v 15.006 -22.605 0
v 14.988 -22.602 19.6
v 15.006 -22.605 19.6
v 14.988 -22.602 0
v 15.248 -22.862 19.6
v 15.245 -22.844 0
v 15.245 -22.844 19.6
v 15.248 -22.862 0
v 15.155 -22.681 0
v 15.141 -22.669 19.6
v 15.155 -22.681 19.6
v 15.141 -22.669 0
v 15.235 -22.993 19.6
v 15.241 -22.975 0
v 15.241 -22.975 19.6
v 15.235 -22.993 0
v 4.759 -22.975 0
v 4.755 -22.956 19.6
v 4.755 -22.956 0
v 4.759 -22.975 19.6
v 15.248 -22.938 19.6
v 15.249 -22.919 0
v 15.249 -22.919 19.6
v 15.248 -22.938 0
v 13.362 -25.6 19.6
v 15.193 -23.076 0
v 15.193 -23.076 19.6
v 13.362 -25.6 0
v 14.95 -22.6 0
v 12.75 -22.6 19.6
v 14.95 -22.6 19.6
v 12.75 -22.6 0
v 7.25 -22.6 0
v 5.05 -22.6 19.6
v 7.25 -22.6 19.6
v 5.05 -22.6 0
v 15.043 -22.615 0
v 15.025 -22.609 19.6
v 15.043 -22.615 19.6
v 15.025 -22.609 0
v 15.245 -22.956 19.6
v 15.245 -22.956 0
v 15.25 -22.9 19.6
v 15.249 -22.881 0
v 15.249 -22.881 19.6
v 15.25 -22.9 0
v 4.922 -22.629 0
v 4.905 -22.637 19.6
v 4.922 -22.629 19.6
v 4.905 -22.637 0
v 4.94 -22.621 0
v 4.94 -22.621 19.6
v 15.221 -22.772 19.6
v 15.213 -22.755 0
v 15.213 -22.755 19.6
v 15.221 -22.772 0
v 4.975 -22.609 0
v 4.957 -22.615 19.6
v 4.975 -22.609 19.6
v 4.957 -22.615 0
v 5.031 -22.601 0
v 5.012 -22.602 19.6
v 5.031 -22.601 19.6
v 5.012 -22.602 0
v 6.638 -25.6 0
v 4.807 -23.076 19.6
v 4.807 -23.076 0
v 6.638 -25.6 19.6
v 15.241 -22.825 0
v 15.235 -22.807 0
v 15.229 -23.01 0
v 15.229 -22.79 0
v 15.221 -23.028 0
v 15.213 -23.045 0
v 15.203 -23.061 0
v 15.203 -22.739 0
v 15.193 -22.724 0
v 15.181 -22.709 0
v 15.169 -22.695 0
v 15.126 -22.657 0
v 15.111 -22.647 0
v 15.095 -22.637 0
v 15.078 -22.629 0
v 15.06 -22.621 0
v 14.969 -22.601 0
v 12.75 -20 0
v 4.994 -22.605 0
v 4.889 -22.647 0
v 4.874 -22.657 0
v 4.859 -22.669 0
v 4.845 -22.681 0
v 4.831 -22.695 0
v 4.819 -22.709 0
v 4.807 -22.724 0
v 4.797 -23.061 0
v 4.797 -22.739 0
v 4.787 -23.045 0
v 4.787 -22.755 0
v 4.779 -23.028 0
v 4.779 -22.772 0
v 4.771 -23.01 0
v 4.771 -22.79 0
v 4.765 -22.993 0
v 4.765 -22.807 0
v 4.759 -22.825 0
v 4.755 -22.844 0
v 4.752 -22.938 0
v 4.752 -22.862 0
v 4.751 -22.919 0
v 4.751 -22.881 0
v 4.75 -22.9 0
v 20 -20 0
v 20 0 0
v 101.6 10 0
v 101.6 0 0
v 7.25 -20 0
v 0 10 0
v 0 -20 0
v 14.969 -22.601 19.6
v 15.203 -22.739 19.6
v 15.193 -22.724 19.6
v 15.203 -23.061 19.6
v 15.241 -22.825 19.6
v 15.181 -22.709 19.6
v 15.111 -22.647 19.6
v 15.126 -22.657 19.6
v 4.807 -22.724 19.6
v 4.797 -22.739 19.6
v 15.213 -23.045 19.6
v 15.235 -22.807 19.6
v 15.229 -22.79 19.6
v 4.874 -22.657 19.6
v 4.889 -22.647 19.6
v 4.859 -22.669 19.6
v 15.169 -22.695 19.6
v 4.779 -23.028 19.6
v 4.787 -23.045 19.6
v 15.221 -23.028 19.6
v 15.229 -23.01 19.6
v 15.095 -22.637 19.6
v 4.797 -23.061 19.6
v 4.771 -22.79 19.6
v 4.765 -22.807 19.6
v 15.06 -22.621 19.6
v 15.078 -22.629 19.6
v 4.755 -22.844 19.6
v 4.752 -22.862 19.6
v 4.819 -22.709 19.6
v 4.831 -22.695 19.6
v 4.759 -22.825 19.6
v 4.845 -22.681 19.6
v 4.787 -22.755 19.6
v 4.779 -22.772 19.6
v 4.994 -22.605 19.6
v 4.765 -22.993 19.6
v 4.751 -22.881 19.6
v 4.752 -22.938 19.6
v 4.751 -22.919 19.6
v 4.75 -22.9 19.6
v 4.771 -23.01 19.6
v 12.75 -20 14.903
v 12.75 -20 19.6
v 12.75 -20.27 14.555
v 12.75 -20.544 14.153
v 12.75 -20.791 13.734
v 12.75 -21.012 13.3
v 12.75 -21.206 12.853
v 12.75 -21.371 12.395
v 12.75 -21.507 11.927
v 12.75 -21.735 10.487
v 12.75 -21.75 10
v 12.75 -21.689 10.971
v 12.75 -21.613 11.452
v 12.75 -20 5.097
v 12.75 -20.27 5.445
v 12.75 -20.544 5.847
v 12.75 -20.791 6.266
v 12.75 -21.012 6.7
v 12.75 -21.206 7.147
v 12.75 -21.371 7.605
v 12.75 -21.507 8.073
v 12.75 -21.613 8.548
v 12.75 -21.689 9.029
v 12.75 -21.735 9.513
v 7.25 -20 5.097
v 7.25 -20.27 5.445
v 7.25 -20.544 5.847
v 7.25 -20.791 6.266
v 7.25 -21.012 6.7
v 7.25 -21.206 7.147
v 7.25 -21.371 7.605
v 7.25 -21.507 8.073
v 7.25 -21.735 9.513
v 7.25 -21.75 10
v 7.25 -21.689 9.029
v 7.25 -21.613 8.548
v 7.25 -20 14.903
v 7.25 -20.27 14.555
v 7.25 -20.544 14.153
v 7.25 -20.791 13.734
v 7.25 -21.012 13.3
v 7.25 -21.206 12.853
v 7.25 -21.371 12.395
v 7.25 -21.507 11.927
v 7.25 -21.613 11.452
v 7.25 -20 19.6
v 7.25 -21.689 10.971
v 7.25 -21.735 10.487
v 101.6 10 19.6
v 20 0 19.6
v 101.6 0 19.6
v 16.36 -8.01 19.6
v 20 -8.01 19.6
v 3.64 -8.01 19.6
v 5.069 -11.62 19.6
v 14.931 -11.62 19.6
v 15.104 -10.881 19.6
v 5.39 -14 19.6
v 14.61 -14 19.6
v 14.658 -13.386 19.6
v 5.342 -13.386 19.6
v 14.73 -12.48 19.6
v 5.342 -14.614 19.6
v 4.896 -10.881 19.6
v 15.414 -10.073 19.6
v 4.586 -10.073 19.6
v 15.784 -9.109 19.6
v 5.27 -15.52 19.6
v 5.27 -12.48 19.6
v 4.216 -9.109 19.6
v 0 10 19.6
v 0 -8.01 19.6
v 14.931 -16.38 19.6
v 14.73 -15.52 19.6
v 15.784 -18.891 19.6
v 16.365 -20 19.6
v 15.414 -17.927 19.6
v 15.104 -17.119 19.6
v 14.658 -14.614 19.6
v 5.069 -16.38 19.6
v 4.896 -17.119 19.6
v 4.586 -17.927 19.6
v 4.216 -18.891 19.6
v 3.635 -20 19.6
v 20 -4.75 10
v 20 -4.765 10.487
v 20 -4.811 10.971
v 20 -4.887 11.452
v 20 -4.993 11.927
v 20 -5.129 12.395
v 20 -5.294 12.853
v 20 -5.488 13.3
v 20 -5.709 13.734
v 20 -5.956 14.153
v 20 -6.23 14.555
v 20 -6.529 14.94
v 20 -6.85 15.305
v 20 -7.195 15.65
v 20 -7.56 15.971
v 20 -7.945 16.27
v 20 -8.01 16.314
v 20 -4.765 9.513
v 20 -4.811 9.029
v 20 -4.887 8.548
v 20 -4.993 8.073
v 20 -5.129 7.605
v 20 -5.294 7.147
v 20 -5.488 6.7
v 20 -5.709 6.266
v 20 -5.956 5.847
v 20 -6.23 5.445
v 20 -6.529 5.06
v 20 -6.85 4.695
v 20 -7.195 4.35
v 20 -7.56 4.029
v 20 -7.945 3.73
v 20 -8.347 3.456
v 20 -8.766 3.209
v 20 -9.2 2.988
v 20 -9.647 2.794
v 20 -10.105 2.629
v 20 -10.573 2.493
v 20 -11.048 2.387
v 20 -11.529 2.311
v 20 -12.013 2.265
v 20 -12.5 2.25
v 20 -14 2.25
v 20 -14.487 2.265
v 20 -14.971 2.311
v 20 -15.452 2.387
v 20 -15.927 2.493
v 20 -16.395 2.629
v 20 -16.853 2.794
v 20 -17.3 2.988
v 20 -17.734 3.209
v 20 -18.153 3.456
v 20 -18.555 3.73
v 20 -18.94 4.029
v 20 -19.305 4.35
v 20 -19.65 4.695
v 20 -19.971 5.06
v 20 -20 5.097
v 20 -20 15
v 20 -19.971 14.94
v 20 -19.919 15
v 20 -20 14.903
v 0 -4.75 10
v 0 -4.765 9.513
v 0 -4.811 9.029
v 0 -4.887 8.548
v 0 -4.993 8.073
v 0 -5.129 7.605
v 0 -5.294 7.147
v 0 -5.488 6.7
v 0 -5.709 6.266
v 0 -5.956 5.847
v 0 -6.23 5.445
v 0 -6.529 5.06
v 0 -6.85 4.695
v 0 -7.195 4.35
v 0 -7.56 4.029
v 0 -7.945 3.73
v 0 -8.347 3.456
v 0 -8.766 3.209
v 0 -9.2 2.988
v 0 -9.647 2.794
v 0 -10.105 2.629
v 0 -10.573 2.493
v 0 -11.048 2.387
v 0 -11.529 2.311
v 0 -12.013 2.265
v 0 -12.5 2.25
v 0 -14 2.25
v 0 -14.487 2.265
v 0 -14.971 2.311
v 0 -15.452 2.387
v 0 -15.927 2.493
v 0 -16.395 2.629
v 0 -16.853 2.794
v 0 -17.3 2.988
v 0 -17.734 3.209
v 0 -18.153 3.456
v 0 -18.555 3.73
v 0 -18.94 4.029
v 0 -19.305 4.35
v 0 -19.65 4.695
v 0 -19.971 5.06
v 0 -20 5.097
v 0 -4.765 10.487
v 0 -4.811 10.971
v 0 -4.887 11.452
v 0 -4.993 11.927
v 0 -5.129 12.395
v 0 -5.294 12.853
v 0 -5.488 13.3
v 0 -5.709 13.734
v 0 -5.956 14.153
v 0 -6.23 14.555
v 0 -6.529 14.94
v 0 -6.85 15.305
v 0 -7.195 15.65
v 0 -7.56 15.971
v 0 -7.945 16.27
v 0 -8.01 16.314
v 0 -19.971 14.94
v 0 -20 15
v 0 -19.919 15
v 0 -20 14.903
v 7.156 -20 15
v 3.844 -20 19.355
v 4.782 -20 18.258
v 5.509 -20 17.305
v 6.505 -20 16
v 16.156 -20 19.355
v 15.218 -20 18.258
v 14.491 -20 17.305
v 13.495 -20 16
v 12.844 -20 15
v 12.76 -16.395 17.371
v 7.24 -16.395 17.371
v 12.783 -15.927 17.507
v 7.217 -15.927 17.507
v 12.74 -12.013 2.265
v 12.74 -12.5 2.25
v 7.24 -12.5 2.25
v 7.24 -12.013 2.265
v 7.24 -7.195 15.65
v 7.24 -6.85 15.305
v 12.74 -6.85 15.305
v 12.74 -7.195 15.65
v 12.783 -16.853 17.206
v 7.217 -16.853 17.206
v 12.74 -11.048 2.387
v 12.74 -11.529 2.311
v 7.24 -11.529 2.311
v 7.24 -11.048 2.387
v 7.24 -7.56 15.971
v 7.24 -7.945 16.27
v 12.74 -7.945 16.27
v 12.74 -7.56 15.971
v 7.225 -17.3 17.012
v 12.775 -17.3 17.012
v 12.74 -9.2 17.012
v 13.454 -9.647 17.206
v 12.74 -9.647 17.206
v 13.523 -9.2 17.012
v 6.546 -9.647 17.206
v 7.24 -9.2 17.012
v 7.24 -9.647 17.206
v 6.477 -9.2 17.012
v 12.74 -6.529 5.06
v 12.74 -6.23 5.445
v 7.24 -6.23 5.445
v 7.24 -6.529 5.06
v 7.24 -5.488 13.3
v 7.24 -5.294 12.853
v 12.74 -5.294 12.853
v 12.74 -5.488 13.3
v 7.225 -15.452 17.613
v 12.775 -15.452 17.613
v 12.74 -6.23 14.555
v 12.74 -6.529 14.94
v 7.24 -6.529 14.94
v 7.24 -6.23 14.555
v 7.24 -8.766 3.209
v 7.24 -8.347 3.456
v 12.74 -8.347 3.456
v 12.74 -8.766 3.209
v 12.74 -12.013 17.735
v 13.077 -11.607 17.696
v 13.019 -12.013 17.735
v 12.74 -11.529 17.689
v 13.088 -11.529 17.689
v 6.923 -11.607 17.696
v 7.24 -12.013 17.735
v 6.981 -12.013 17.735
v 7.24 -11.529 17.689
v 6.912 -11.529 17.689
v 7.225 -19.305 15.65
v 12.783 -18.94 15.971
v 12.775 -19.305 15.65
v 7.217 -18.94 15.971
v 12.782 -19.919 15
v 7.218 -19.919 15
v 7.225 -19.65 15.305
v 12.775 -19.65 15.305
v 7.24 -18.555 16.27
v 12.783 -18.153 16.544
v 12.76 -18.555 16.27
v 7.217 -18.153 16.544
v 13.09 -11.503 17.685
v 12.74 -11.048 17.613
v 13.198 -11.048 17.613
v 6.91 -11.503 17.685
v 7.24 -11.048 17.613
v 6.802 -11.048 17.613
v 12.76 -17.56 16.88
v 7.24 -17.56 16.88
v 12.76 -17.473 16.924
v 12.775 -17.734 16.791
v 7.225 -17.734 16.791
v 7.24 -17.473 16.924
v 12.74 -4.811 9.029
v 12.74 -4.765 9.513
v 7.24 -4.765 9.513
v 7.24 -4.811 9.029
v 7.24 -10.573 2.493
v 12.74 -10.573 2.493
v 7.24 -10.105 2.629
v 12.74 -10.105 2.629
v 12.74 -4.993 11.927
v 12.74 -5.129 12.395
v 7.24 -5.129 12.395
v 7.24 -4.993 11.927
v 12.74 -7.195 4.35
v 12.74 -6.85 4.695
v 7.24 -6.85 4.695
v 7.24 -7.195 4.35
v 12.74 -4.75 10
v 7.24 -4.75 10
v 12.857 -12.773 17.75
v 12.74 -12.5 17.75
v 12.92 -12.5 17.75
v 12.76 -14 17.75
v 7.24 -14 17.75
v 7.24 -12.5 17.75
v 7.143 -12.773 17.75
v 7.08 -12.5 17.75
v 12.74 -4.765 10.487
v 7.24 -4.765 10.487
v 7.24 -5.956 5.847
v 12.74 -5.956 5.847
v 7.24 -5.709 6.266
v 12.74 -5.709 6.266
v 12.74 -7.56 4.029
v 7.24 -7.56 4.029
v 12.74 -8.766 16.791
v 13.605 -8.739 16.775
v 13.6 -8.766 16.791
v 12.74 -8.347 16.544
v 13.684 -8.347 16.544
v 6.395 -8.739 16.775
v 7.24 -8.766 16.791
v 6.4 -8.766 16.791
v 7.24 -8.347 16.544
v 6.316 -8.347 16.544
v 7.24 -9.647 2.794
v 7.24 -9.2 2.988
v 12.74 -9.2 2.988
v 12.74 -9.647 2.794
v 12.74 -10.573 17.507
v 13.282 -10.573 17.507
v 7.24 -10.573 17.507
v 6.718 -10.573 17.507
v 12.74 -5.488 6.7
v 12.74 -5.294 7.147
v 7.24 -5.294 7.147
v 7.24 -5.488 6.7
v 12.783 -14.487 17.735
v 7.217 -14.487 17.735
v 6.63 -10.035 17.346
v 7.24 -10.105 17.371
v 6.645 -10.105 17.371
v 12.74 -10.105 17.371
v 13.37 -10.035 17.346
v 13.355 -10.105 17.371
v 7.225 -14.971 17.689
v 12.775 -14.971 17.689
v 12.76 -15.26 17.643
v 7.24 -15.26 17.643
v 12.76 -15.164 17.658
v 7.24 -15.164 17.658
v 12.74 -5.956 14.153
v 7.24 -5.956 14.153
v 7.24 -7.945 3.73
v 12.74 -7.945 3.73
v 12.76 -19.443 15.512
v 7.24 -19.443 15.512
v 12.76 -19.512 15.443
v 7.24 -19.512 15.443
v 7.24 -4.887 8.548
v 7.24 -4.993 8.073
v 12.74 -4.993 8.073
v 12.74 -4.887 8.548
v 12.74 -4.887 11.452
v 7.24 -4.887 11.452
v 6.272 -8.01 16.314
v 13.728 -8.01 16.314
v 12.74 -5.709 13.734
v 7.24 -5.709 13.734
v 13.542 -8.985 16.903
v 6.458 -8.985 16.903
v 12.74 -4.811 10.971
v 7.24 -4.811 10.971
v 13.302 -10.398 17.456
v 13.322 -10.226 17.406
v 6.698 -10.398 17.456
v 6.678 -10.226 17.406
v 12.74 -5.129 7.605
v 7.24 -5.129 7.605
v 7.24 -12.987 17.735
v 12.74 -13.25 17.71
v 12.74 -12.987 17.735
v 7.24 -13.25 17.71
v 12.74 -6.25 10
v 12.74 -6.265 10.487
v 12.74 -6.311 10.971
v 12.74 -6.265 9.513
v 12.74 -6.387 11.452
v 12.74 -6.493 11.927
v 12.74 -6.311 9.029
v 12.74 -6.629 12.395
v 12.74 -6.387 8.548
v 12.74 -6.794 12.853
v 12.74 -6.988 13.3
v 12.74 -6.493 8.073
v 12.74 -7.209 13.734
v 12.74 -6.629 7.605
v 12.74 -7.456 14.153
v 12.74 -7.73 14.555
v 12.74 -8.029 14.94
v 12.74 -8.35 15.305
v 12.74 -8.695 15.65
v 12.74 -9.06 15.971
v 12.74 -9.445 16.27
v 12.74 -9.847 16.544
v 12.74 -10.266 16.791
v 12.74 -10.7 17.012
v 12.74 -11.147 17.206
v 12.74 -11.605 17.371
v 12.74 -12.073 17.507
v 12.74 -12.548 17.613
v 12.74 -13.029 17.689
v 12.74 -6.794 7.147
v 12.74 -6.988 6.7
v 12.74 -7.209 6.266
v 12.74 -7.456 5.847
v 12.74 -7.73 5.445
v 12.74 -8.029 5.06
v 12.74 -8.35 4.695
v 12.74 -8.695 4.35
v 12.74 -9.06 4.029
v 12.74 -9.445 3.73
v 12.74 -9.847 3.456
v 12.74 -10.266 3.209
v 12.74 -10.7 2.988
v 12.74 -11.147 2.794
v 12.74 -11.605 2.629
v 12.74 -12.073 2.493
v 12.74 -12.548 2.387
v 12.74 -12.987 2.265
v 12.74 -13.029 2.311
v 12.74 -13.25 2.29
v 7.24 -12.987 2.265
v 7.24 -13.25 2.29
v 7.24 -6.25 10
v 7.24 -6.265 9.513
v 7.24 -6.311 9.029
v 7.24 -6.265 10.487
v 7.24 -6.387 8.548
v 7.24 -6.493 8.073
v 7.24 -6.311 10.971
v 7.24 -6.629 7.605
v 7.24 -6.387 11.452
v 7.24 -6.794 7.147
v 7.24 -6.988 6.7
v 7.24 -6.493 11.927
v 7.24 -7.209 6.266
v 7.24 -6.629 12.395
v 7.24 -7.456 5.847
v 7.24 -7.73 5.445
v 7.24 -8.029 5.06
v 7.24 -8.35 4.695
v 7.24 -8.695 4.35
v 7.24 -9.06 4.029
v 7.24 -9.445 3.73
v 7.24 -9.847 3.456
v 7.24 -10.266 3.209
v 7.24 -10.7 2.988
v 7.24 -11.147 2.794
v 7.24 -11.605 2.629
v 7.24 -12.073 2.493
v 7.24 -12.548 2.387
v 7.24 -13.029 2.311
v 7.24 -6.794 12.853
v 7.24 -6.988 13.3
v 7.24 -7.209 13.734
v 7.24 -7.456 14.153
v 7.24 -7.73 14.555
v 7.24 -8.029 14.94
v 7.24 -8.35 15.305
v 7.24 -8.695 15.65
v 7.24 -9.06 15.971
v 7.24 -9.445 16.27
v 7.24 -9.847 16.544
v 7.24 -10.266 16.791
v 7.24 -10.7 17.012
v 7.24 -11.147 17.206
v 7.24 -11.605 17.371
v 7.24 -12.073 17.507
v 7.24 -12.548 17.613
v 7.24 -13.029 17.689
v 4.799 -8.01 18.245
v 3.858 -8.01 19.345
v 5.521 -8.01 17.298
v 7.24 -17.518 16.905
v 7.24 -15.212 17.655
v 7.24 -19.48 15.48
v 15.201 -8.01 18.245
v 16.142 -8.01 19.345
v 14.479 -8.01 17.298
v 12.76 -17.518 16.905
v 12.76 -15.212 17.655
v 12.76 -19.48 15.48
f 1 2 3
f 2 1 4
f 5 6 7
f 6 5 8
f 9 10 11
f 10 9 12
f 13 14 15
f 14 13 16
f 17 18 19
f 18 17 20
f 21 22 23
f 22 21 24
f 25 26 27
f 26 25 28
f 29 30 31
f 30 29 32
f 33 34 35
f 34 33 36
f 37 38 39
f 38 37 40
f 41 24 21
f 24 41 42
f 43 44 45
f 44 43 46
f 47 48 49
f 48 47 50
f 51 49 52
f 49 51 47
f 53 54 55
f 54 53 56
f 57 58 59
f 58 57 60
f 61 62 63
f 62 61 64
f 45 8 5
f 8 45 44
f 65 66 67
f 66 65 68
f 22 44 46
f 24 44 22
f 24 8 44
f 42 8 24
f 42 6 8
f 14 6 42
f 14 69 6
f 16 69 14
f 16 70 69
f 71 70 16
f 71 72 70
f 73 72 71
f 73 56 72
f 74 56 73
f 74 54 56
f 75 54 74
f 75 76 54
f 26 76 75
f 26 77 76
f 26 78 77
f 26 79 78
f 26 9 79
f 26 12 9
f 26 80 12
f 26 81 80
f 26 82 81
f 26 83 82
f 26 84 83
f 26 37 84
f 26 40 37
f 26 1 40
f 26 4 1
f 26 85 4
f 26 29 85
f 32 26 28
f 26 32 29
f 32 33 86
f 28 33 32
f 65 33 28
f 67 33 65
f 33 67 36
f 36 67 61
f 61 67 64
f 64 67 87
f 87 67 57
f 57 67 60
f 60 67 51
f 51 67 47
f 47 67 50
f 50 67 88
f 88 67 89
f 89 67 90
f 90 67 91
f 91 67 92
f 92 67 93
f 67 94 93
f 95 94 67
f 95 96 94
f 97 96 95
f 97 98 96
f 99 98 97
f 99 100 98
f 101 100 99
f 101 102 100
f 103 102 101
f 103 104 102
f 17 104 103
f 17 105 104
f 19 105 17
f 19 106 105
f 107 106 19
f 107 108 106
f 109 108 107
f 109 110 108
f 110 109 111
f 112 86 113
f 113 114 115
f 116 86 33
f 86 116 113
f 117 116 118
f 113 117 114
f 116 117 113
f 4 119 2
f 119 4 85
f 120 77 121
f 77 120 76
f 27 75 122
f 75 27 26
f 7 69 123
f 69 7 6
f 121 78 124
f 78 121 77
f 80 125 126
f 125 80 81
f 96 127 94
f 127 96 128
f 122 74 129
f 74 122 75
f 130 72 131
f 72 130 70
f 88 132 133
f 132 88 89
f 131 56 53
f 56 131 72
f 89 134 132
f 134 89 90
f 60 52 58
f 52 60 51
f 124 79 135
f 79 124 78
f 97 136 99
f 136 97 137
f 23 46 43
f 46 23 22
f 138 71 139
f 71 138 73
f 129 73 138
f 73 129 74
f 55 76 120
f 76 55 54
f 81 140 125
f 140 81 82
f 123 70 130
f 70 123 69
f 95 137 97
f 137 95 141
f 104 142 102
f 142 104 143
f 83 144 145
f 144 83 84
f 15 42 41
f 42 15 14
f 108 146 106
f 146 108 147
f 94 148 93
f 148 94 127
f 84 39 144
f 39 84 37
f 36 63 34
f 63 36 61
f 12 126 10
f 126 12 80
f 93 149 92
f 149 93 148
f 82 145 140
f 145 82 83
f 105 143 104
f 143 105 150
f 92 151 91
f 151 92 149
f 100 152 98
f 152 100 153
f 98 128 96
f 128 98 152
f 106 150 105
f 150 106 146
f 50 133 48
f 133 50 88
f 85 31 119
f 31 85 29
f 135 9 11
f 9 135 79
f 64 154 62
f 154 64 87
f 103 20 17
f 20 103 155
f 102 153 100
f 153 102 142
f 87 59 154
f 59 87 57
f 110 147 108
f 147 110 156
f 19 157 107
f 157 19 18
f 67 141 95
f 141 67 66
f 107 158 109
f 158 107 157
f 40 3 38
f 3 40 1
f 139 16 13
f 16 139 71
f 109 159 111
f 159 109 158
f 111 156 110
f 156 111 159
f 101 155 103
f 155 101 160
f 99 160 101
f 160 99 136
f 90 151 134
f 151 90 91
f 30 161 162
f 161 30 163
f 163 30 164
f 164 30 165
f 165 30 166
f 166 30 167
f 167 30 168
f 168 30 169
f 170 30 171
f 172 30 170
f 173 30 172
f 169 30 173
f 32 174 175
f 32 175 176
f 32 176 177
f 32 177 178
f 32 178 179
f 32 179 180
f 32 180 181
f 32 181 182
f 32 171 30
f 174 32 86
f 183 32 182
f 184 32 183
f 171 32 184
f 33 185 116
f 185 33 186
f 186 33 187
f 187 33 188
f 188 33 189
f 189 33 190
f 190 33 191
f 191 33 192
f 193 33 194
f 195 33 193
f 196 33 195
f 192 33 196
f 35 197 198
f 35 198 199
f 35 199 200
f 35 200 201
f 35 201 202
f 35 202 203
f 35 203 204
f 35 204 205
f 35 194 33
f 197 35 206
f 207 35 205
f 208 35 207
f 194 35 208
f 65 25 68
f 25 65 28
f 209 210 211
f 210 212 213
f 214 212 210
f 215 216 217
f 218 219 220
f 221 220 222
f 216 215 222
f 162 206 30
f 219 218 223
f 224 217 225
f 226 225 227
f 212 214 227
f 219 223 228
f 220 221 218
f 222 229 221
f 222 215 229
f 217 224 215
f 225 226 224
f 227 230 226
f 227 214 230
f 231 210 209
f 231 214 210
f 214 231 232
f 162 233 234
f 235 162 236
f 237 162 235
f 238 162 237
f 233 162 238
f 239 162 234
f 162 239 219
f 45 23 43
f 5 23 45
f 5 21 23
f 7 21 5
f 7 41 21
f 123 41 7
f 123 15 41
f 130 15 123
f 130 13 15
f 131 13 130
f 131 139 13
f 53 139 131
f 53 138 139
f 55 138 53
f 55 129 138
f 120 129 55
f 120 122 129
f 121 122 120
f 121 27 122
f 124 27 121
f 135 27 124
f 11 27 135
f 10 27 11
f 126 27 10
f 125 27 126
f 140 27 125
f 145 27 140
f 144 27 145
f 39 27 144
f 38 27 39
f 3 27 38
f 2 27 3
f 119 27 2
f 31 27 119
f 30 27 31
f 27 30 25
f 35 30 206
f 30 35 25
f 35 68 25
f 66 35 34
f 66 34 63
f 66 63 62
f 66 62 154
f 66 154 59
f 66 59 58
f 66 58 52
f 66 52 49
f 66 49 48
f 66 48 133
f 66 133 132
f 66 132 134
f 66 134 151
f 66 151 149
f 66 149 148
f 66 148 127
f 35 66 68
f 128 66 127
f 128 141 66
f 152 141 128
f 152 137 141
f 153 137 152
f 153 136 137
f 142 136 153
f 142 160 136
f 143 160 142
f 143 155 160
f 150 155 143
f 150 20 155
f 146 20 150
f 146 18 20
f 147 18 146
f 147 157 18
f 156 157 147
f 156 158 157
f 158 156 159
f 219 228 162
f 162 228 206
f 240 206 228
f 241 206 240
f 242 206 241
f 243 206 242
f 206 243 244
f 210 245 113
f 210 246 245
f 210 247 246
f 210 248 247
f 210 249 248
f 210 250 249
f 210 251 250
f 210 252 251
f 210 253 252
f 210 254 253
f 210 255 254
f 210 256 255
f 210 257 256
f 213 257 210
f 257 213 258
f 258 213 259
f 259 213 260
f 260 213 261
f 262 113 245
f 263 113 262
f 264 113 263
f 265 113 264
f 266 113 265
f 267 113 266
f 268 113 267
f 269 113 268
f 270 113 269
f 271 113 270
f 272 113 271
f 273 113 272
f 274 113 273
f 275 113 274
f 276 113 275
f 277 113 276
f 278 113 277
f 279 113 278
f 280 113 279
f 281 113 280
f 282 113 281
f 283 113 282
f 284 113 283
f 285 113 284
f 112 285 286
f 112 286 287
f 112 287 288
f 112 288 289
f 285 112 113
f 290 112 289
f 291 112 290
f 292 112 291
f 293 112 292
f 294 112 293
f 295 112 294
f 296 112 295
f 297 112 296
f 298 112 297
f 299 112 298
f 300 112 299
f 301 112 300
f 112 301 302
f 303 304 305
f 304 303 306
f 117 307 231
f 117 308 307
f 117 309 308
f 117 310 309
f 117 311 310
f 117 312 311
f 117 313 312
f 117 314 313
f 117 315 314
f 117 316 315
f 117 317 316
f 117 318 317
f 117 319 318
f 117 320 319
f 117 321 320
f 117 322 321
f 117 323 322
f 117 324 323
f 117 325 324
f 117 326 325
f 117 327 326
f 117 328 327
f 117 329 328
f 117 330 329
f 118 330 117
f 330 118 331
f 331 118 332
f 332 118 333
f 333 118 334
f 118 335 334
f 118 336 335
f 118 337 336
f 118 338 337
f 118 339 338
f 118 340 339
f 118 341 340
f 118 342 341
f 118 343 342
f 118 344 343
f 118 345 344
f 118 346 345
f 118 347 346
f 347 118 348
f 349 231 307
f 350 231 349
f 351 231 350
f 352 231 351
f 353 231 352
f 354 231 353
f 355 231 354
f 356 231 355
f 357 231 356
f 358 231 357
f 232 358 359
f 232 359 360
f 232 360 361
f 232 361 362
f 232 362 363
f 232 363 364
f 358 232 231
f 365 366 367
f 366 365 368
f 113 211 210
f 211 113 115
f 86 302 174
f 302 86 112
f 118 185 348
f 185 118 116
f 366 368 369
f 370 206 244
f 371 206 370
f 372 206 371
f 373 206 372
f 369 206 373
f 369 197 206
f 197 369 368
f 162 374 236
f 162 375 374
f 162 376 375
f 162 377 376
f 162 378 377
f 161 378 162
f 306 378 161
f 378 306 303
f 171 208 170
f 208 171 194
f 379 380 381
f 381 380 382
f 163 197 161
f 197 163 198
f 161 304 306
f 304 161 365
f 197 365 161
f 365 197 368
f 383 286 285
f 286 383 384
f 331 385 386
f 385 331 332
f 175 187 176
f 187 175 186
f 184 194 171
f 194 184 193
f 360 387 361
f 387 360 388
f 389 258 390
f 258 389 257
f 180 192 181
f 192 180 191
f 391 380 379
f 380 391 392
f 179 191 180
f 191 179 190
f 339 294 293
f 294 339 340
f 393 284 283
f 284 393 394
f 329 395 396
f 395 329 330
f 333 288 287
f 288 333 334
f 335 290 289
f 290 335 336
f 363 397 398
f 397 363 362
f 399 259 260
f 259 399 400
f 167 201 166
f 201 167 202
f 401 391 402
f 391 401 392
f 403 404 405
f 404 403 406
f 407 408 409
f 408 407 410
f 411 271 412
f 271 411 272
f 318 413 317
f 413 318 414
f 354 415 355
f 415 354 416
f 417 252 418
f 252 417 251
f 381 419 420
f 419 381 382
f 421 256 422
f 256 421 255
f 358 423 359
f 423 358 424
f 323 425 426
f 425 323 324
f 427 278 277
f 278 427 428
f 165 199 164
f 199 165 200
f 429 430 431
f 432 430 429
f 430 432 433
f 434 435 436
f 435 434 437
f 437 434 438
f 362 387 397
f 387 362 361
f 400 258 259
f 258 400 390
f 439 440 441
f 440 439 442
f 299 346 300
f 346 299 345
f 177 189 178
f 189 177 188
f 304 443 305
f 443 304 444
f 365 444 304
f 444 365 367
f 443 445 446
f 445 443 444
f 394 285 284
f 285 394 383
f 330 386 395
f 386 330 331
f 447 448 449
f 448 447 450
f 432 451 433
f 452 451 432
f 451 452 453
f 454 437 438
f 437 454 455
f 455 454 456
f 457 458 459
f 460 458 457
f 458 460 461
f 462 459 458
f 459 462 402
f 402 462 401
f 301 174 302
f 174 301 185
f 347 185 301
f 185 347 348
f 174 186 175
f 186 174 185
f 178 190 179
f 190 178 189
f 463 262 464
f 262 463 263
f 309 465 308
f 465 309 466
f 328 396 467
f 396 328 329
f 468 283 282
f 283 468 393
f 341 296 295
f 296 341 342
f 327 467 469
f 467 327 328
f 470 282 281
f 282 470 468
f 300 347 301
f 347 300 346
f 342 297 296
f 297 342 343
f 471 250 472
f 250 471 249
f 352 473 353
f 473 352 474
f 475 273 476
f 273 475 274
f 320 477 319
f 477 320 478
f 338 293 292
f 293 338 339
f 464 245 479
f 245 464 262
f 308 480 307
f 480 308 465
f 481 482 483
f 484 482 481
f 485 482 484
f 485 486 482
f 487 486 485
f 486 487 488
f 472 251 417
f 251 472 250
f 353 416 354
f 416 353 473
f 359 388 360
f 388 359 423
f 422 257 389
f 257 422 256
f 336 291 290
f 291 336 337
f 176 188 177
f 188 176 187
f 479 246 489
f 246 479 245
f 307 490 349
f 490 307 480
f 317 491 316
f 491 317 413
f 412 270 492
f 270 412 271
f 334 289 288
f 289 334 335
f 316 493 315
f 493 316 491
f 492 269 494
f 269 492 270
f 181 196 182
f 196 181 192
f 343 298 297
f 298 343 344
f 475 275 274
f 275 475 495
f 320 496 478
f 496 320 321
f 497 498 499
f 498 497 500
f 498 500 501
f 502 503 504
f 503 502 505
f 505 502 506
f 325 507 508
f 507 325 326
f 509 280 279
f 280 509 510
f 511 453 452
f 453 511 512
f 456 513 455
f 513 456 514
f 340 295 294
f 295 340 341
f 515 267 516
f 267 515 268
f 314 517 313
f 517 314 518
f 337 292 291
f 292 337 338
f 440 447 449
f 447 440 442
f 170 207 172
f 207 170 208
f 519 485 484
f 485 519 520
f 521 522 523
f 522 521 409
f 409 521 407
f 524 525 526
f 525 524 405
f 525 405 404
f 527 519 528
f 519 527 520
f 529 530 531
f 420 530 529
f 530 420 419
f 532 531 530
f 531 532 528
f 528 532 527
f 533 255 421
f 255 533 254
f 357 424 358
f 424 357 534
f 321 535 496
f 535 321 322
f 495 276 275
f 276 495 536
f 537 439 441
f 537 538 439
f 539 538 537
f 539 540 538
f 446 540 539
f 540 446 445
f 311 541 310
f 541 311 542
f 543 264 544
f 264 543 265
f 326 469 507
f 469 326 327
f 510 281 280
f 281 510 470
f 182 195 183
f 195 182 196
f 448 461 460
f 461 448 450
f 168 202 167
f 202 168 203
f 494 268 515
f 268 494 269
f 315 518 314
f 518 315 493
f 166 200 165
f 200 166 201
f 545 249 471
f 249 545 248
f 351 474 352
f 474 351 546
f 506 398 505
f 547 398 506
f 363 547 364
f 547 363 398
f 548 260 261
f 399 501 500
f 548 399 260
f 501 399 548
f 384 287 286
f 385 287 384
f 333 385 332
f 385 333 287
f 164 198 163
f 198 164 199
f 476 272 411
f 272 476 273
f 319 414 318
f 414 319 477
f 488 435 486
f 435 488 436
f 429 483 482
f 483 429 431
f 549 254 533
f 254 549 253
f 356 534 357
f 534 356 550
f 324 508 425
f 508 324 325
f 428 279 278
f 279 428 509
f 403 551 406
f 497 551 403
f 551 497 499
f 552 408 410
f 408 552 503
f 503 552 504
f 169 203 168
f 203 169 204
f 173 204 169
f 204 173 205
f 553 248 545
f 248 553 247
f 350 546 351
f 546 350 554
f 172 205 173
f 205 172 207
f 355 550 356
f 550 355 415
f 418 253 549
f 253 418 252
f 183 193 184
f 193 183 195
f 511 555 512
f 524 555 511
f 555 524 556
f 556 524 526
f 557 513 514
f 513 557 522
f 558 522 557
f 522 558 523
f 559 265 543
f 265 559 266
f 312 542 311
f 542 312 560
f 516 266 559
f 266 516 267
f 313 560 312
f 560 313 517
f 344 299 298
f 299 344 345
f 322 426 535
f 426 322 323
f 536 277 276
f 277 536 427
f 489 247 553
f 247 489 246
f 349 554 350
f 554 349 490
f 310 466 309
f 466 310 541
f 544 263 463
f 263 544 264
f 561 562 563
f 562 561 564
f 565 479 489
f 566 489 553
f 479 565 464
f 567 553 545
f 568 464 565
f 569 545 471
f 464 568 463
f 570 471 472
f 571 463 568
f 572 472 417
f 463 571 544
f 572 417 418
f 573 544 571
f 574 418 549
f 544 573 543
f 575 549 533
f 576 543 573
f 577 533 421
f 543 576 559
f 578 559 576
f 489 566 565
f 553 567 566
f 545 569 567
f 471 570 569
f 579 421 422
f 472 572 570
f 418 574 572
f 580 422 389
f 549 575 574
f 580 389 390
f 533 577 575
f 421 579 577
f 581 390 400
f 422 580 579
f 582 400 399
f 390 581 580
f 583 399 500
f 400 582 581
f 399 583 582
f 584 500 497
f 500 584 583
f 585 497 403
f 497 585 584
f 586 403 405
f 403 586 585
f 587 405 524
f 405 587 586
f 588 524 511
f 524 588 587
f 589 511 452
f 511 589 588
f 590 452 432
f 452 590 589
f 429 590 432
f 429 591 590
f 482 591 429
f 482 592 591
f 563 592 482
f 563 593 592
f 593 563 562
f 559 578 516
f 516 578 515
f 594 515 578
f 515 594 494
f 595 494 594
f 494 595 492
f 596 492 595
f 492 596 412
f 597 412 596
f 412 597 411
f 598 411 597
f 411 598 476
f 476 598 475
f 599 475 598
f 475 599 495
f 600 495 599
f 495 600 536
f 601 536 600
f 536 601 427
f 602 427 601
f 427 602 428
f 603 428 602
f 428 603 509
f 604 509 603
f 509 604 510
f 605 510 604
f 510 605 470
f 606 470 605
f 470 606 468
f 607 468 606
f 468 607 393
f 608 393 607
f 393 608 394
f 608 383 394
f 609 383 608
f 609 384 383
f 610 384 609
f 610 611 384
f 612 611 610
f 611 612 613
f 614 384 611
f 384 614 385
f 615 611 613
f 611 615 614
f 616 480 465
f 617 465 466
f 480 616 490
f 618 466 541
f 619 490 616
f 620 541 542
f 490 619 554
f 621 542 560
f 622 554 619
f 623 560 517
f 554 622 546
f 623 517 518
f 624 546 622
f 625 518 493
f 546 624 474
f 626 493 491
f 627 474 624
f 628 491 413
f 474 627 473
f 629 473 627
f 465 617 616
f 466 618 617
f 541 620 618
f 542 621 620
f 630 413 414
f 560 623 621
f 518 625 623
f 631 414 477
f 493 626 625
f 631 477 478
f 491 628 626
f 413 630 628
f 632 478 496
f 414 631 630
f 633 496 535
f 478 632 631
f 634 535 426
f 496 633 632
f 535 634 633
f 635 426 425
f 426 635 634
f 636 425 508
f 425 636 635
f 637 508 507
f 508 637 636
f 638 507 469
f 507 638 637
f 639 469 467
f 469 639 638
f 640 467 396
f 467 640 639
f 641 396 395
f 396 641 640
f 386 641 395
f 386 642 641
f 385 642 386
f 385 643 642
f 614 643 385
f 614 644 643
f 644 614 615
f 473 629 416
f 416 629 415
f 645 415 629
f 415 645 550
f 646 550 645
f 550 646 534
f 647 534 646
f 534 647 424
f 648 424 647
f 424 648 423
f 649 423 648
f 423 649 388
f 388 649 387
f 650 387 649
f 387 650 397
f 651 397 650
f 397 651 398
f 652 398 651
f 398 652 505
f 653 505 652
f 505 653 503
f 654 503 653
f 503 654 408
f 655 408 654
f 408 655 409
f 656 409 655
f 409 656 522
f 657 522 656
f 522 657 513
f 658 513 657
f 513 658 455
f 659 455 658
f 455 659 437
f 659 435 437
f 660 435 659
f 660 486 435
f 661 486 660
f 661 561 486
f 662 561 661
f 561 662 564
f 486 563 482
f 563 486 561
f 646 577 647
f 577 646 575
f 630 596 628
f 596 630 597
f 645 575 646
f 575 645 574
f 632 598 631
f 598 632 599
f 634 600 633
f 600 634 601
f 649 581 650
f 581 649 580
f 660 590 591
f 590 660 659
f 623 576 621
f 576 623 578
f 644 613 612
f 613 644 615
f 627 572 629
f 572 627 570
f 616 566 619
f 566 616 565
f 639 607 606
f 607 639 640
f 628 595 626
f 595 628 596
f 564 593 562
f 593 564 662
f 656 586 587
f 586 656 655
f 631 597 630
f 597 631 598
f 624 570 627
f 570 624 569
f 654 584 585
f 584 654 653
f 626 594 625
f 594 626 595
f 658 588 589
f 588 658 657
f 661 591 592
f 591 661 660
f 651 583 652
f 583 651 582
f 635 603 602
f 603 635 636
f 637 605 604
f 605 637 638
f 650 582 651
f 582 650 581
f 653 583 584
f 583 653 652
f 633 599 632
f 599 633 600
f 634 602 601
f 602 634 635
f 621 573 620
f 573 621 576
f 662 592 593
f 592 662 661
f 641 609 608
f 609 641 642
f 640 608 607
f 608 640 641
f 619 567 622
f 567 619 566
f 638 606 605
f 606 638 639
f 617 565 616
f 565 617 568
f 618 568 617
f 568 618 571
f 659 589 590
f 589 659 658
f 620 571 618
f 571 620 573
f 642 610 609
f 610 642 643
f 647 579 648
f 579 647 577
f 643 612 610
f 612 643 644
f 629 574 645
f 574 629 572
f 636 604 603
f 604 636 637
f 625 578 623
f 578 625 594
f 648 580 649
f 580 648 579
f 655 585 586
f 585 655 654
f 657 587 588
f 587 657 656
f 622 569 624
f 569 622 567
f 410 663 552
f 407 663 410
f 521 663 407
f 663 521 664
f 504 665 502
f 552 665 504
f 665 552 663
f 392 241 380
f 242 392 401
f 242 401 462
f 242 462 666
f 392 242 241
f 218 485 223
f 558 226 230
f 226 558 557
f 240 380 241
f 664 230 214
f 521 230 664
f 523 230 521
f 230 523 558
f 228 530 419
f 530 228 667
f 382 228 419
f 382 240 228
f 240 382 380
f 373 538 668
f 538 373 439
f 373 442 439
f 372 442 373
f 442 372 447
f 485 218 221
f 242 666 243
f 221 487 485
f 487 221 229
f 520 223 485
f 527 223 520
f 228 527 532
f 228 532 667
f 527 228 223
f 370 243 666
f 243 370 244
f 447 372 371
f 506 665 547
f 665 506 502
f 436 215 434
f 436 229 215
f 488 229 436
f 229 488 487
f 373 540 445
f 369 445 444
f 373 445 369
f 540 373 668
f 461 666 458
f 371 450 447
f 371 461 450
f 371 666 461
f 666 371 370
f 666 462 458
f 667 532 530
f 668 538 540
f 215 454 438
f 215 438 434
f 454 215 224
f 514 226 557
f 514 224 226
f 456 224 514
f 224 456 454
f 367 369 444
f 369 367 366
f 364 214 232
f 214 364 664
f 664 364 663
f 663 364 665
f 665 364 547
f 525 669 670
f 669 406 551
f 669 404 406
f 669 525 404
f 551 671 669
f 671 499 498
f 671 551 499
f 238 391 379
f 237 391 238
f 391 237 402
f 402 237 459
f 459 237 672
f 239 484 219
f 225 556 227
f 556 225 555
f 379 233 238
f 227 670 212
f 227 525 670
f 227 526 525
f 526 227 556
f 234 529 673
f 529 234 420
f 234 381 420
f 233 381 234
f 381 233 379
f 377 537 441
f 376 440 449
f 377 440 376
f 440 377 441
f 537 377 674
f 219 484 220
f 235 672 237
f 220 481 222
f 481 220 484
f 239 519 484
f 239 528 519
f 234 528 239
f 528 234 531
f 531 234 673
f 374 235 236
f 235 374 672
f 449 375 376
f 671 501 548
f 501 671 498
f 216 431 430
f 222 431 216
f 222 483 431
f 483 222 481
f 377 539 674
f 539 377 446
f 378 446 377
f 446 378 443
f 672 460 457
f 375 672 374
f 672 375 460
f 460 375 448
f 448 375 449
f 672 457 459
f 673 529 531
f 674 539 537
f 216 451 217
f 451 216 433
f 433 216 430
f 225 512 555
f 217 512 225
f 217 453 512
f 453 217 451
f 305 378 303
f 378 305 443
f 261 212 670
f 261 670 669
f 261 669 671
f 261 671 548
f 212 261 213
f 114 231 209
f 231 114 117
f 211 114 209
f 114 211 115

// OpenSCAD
skip_jaw=1;
include <QRClamp.scad>;
rail_w=19.6;
rail_len=25.4*4;

rail();
module rail(clamp=1) {
  rotate([90,0]) rotate([0,90,0]) cube([10,rail_w,rail_len]);
  if(!clamp)
    intersection() {
      translate([10,0,10]) groove_clamp(20,0);
      translate([0,-10,0]) cube([20,10,rail_w]);
    }
  else difference() {
    union() {
      mirror([0,1,0]) cube([20,20,rail_w]);
      intersection() {
      translate([10,-20,10]) groove_clamp(20,10);
        rotate([0,0,-90]) cube([30,20,rail_w]);
      }
    }
    translate([9.99,-20,10]) cam_sub(20.2);
    translate([10,0]) for(m=[0,1]) mirror([m,0]) translate([-10,0])
    {
      intersection()
      {
      translate([-.01,-14,10]) rotate([0,90]) cylinder(d1=30,d2=15.5,h=7.25,$fn=40);
      translate([-.01,-20.01,15]) cube([7.25,12,5.1]);
      }
      //translate([-.01,-20.01,15]) cube([7.25,11,5.1]);
    }
  }
}
module shim(w=16.1,h=9,r=2)
{
//for(x=[0,32.6]) translate([x,0])

  translate([-.1,0]) cube([16.1,50,7]);
  translate([-.1,0,9]) rotate([-90,0]) cube2([16.1,9,50]);
translate([-17,0]) difference() {
  cube([50,3,12]);
  for(x=[6,44])
    translate([x,-.01,6]) rotate([-90,0]) {
      cylinder(d=4,h=5,$fn=30);
      cylinder(d1=8,d2=4,h=2,$fn=40);
    }
}
}

module cube2(dims,r=2)
{
  linear_extrude(dims[2],convexity=4) {
    hull() {
      for(x=[r,dims[0]-r],y=[r,dims[1]-r])
        translate([x,y]) circle(r=r,$fn=30);
    }
  }
}
